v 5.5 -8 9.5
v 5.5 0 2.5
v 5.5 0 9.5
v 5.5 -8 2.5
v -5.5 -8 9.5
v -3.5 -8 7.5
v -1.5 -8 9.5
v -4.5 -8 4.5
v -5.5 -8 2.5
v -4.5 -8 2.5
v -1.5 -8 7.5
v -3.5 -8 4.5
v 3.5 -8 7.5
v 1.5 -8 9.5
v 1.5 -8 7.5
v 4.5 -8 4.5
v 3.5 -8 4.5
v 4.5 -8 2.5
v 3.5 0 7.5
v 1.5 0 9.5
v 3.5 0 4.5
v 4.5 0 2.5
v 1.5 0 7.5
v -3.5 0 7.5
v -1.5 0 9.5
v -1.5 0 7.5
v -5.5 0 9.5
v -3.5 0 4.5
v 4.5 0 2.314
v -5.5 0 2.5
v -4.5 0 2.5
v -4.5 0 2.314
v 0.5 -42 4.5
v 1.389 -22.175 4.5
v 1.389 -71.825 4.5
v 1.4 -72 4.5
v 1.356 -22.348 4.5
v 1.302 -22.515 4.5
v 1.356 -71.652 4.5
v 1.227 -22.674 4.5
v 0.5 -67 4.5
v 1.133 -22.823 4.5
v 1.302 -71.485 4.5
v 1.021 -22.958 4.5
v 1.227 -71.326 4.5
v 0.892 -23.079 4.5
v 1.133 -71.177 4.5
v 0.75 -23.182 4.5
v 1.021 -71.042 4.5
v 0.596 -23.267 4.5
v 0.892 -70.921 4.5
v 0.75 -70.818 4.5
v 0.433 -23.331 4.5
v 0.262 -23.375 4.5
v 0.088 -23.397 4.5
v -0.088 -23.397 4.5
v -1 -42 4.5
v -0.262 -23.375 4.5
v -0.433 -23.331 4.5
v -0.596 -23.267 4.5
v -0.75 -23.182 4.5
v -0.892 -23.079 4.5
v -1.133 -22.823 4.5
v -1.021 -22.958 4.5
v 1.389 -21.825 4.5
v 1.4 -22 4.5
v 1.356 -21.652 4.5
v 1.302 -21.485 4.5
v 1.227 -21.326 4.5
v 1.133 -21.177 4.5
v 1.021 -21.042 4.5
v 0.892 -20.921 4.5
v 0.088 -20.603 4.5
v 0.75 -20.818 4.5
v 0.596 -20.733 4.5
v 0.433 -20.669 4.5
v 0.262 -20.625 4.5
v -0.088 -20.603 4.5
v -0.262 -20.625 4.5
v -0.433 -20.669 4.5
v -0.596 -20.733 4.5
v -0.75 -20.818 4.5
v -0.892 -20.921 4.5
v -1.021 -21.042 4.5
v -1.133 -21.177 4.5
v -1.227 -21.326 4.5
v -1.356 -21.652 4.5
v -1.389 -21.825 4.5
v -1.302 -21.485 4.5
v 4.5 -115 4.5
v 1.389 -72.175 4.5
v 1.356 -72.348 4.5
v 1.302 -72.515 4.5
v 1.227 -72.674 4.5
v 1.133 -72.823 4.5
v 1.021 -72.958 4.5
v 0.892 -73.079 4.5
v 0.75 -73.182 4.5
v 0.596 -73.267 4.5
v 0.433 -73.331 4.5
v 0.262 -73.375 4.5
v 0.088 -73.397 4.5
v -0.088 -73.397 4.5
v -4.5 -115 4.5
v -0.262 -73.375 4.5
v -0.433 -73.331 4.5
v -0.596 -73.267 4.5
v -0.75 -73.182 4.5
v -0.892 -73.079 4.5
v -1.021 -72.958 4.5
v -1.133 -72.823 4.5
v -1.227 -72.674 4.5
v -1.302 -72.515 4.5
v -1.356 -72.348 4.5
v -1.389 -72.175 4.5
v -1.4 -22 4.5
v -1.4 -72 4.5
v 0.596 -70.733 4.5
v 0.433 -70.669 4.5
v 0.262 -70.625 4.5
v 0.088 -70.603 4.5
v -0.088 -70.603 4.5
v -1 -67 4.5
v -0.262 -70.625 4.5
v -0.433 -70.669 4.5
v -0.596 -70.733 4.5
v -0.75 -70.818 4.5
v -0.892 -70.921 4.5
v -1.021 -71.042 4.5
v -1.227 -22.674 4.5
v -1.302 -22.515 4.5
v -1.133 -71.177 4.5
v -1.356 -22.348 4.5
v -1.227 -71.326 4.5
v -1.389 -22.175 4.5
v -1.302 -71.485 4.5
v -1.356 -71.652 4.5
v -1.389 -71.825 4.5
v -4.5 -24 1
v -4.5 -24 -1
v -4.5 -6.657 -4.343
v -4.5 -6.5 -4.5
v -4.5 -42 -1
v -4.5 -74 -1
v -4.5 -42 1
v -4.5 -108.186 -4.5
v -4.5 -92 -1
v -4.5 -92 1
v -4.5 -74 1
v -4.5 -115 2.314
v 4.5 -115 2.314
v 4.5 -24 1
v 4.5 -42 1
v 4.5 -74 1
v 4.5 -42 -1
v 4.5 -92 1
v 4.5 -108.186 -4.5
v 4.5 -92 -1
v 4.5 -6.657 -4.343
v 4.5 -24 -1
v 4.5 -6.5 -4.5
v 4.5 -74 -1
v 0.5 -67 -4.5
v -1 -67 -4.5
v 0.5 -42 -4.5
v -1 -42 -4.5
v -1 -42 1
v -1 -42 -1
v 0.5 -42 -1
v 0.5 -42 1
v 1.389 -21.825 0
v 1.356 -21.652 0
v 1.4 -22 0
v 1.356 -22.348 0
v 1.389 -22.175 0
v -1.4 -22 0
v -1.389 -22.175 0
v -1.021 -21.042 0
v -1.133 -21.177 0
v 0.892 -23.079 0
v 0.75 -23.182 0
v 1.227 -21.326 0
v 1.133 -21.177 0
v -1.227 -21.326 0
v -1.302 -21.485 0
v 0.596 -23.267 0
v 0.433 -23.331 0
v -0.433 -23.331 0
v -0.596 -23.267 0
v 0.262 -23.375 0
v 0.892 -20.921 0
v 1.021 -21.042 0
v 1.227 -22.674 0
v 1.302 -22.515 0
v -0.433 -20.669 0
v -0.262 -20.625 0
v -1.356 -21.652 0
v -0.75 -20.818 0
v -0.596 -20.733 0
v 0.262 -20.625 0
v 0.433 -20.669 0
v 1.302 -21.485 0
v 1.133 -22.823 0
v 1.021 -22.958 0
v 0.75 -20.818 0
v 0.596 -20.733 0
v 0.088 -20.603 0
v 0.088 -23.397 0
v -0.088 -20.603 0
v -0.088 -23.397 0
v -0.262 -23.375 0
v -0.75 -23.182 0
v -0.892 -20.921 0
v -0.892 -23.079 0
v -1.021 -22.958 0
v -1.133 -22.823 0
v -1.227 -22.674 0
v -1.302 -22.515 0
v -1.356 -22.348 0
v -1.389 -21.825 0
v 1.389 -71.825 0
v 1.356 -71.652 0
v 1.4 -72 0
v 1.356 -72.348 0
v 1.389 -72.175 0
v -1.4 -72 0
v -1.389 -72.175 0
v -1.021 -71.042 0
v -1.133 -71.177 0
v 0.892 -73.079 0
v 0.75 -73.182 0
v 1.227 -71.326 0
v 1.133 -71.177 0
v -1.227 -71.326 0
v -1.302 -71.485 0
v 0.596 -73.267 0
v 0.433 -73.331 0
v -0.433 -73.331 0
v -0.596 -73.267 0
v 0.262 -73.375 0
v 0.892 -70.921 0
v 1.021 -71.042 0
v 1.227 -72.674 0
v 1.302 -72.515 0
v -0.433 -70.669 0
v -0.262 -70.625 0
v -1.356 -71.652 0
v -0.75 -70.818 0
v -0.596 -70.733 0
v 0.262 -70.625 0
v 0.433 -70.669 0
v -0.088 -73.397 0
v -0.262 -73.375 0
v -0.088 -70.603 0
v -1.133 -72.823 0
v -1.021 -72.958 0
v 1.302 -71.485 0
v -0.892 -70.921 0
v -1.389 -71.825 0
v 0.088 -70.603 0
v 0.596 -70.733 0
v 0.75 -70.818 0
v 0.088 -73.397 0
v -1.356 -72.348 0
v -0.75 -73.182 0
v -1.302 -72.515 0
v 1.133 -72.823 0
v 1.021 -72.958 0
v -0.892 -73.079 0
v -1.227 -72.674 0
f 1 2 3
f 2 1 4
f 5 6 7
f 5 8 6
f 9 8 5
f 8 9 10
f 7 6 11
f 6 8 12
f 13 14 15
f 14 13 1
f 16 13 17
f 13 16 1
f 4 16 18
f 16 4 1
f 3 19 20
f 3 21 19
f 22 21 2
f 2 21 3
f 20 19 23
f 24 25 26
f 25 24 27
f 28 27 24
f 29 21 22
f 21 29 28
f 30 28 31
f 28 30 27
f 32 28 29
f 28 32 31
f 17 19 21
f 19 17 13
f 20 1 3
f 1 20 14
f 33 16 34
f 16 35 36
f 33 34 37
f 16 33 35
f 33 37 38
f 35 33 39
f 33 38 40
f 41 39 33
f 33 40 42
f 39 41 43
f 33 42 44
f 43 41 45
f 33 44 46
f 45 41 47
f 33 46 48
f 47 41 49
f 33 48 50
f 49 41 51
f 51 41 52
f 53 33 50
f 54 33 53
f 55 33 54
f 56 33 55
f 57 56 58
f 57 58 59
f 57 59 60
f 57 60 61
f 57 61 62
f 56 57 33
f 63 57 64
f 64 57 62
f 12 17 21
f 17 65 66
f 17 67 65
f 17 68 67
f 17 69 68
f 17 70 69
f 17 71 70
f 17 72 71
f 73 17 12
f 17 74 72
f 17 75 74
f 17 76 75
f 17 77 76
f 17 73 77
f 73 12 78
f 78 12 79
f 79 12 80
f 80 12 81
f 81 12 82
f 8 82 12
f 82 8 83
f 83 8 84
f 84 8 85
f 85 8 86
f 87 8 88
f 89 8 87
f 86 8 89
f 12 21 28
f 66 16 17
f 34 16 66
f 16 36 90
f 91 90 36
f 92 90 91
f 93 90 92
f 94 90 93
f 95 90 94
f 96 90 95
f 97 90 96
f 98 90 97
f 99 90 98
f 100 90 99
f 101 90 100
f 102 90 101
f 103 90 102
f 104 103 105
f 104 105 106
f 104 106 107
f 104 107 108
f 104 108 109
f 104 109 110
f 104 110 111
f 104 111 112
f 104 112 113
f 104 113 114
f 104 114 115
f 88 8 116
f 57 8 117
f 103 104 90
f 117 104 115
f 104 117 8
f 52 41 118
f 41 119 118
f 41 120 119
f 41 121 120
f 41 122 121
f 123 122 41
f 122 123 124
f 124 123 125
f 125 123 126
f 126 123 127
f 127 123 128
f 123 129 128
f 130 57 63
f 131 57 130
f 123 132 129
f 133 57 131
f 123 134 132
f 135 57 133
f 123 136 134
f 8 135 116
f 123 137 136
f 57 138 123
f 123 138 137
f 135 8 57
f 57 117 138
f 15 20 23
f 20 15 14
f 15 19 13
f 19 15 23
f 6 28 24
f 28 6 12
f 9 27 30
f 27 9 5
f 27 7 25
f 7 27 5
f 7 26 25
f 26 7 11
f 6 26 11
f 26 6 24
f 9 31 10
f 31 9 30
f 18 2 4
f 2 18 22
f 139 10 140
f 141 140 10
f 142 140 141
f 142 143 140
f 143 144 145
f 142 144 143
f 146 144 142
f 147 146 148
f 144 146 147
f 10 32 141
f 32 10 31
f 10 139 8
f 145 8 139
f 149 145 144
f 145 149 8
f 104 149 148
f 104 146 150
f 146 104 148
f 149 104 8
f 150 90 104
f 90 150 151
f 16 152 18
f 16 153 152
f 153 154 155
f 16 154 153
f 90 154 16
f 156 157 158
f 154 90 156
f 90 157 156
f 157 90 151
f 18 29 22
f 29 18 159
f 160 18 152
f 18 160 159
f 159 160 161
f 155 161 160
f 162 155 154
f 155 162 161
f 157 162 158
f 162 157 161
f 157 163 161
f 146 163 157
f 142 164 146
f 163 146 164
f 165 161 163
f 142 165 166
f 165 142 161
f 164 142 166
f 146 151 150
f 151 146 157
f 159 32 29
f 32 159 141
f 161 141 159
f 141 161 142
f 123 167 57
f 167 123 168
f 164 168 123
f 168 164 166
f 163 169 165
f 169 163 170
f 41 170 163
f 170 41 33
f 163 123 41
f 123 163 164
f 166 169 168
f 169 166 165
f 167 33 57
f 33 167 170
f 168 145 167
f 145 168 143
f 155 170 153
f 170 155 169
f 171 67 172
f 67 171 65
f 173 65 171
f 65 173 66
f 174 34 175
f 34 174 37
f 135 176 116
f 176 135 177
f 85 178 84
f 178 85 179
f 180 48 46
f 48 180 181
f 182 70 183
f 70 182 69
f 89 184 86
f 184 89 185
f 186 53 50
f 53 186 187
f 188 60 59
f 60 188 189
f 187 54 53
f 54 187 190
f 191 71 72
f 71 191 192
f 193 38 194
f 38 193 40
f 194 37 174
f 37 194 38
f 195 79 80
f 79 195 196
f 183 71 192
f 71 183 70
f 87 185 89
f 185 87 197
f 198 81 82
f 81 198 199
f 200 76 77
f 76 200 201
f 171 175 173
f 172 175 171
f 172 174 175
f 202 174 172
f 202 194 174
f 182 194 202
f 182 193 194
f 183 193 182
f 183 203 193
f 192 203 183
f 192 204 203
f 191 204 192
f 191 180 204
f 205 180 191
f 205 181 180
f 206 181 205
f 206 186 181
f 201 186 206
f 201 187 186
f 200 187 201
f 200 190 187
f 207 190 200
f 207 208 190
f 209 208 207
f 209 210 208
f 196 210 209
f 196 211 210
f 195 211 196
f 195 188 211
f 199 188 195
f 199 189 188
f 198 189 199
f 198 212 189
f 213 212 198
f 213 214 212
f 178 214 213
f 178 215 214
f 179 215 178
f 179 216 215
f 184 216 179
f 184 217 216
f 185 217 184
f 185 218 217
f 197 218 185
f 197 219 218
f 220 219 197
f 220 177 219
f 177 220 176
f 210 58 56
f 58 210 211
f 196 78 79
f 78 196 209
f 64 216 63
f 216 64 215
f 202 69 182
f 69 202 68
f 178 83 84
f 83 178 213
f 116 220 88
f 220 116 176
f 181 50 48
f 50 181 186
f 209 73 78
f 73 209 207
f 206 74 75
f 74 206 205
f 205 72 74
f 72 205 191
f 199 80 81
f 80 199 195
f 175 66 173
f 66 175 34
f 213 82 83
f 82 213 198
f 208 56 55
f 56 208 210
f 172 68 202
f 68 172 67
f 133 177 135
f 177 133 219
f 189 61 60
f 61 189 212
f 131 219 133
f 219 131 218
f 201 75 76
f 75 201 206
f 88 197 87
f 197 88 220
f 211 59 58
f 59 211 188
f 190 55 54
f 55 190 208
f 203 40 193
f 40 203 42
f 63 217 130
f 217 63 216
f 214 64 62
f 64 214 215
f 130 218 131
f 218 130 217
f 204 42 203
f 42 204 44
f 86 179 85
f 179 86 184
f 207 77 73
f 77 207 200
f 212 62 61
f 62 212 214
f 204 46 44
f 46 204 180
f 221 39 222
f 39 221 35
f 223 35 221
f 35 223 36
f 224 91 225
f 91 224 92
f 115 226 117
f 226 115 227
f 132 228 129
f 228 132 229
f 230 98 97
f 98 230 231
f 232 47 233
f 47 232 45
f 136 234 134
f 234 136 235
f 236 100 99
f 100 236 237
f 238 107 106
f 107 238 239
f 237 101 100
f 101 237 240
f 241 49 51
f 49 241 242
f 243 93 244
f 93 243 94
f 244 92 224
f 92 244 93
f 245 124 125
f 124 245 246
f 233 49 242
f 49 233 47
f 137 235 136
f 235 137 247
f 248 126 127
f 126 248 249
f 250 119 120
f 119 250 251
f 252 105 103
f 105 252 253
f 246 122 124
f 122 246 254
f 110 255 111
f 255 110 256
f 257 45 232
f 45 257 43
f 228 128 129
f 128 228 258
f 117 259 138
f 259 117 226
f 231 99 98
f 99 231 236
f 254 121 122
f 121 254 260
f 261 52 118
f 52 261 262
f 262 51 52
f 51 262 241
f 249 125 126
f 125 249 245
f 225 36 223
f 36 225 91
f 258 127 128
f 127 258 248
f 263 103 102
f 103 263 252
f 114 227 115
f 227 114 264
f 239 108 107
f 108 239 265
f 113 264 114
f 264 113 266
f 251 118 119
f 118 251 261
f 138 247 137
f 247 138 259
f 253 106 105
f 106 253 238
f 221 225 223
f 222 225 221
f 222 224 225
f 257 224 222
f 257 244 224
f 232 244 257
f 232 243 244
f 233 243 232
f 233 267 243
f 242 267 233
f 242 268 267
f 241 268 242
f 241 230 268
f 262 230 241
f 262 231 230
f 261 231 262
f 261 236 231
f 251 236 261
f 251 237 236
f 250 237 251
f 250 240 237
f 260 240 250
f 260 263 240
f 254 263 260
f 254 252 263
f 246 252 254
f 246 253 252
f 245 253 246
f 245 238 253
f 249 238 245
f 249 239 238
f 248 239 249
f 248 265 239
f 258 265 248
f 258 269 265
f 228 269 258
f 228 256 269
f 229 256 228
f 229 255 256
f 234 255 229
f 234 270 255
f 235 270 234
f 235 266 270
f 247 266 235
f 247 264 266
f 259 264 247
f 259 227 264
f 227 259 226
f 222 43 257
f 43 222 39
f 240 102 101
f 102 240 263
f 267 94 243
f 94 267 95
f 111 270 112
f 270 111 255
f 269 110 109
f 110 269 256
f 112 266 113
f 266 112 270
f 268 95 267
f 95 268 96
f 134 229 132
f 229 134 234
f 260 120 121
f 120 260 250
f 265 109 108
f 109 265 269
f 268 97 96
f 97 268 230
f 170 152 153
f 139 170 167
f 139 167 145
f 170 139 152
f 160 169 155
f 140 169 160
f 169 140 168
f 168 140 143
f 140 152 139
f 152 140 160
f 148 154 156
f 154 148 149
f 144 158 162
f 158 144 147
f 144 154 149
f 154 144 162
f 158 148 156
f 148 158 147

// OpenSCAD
$fn=50;

KEEL_W=9.0;
KEEL_H=9.0;
KEEL_L=115;

difference() {
    union() {
        // measuring posts
        //translate([0,  MOUNT_HOLE_OFFSET+15, 0]) cylinder(h=7, d=1.0);            
        //translate([0, MOUNT_HOLE_OFFSET+30, 0]) cylinder(h=7, d=1.0);
        
        // keel
        rotate([90,0,0])
        linear_extrude(KEEL_L) square([KEEL_W, KEEL_H], center=true); 
        // cable clamp
        translate([1.5, 0, 4.5])
        rotate([90, 0, 0])
        union(){
            // Vertical arm of the C-clamp 2
            translate([2.0, 0, 0]) cube([2, 5, 8]);
            // Horizontal arm of the C-clamp
            rotate([90, 0, 0])
            translate([0, 0, -5]) cube([2, 8, 2]);
            // Vertical arm of the C-clamp 1
            translate([-7, 0, 0]) cube([2, 5, 8]);
            // Horizontal arm of the C-clamp
            rotate([90, 0, 0])
            translate([-5.0, 0,-5]) cube([2, 8, 2]);
            // clamp bed
            rotate([90, 0, 0])
            translate([-7.0, 0,-0]) cube([11, 8, 2]);
        }
    }
    
    // front of keel slope
    translate([-5, -KEEL_L-6, -3])
    rotate([-45, 0, 0])
    //(x, z, y)
    cube([10, 11, 8]); 
    
    // rear of keel slope
    translate([-5, -1, -10])
    rotate([45, 0, 0])
    //(x, z, y)
    cube([10, 11, 8]);  
 
    //center cutout - vent
    translate([-1.0, -42.0, -5.0])
    rotate([90,0,0])
    //y, z, x
    cube([1.5, 10, 25]);
    
    // screw holes
    translate([0, -22, 0]) cylinder(h=5, d=2.8); 
    translate([0.0, -72, 0]) cylinder(h=5, d=2.8);   

    // thru slots for straps
    translate([-7.0, -42,-1]) cube([14, 18, 2]);       
    translate([-7.0, -92,-1]) cube([14, 18, 2]);
}
